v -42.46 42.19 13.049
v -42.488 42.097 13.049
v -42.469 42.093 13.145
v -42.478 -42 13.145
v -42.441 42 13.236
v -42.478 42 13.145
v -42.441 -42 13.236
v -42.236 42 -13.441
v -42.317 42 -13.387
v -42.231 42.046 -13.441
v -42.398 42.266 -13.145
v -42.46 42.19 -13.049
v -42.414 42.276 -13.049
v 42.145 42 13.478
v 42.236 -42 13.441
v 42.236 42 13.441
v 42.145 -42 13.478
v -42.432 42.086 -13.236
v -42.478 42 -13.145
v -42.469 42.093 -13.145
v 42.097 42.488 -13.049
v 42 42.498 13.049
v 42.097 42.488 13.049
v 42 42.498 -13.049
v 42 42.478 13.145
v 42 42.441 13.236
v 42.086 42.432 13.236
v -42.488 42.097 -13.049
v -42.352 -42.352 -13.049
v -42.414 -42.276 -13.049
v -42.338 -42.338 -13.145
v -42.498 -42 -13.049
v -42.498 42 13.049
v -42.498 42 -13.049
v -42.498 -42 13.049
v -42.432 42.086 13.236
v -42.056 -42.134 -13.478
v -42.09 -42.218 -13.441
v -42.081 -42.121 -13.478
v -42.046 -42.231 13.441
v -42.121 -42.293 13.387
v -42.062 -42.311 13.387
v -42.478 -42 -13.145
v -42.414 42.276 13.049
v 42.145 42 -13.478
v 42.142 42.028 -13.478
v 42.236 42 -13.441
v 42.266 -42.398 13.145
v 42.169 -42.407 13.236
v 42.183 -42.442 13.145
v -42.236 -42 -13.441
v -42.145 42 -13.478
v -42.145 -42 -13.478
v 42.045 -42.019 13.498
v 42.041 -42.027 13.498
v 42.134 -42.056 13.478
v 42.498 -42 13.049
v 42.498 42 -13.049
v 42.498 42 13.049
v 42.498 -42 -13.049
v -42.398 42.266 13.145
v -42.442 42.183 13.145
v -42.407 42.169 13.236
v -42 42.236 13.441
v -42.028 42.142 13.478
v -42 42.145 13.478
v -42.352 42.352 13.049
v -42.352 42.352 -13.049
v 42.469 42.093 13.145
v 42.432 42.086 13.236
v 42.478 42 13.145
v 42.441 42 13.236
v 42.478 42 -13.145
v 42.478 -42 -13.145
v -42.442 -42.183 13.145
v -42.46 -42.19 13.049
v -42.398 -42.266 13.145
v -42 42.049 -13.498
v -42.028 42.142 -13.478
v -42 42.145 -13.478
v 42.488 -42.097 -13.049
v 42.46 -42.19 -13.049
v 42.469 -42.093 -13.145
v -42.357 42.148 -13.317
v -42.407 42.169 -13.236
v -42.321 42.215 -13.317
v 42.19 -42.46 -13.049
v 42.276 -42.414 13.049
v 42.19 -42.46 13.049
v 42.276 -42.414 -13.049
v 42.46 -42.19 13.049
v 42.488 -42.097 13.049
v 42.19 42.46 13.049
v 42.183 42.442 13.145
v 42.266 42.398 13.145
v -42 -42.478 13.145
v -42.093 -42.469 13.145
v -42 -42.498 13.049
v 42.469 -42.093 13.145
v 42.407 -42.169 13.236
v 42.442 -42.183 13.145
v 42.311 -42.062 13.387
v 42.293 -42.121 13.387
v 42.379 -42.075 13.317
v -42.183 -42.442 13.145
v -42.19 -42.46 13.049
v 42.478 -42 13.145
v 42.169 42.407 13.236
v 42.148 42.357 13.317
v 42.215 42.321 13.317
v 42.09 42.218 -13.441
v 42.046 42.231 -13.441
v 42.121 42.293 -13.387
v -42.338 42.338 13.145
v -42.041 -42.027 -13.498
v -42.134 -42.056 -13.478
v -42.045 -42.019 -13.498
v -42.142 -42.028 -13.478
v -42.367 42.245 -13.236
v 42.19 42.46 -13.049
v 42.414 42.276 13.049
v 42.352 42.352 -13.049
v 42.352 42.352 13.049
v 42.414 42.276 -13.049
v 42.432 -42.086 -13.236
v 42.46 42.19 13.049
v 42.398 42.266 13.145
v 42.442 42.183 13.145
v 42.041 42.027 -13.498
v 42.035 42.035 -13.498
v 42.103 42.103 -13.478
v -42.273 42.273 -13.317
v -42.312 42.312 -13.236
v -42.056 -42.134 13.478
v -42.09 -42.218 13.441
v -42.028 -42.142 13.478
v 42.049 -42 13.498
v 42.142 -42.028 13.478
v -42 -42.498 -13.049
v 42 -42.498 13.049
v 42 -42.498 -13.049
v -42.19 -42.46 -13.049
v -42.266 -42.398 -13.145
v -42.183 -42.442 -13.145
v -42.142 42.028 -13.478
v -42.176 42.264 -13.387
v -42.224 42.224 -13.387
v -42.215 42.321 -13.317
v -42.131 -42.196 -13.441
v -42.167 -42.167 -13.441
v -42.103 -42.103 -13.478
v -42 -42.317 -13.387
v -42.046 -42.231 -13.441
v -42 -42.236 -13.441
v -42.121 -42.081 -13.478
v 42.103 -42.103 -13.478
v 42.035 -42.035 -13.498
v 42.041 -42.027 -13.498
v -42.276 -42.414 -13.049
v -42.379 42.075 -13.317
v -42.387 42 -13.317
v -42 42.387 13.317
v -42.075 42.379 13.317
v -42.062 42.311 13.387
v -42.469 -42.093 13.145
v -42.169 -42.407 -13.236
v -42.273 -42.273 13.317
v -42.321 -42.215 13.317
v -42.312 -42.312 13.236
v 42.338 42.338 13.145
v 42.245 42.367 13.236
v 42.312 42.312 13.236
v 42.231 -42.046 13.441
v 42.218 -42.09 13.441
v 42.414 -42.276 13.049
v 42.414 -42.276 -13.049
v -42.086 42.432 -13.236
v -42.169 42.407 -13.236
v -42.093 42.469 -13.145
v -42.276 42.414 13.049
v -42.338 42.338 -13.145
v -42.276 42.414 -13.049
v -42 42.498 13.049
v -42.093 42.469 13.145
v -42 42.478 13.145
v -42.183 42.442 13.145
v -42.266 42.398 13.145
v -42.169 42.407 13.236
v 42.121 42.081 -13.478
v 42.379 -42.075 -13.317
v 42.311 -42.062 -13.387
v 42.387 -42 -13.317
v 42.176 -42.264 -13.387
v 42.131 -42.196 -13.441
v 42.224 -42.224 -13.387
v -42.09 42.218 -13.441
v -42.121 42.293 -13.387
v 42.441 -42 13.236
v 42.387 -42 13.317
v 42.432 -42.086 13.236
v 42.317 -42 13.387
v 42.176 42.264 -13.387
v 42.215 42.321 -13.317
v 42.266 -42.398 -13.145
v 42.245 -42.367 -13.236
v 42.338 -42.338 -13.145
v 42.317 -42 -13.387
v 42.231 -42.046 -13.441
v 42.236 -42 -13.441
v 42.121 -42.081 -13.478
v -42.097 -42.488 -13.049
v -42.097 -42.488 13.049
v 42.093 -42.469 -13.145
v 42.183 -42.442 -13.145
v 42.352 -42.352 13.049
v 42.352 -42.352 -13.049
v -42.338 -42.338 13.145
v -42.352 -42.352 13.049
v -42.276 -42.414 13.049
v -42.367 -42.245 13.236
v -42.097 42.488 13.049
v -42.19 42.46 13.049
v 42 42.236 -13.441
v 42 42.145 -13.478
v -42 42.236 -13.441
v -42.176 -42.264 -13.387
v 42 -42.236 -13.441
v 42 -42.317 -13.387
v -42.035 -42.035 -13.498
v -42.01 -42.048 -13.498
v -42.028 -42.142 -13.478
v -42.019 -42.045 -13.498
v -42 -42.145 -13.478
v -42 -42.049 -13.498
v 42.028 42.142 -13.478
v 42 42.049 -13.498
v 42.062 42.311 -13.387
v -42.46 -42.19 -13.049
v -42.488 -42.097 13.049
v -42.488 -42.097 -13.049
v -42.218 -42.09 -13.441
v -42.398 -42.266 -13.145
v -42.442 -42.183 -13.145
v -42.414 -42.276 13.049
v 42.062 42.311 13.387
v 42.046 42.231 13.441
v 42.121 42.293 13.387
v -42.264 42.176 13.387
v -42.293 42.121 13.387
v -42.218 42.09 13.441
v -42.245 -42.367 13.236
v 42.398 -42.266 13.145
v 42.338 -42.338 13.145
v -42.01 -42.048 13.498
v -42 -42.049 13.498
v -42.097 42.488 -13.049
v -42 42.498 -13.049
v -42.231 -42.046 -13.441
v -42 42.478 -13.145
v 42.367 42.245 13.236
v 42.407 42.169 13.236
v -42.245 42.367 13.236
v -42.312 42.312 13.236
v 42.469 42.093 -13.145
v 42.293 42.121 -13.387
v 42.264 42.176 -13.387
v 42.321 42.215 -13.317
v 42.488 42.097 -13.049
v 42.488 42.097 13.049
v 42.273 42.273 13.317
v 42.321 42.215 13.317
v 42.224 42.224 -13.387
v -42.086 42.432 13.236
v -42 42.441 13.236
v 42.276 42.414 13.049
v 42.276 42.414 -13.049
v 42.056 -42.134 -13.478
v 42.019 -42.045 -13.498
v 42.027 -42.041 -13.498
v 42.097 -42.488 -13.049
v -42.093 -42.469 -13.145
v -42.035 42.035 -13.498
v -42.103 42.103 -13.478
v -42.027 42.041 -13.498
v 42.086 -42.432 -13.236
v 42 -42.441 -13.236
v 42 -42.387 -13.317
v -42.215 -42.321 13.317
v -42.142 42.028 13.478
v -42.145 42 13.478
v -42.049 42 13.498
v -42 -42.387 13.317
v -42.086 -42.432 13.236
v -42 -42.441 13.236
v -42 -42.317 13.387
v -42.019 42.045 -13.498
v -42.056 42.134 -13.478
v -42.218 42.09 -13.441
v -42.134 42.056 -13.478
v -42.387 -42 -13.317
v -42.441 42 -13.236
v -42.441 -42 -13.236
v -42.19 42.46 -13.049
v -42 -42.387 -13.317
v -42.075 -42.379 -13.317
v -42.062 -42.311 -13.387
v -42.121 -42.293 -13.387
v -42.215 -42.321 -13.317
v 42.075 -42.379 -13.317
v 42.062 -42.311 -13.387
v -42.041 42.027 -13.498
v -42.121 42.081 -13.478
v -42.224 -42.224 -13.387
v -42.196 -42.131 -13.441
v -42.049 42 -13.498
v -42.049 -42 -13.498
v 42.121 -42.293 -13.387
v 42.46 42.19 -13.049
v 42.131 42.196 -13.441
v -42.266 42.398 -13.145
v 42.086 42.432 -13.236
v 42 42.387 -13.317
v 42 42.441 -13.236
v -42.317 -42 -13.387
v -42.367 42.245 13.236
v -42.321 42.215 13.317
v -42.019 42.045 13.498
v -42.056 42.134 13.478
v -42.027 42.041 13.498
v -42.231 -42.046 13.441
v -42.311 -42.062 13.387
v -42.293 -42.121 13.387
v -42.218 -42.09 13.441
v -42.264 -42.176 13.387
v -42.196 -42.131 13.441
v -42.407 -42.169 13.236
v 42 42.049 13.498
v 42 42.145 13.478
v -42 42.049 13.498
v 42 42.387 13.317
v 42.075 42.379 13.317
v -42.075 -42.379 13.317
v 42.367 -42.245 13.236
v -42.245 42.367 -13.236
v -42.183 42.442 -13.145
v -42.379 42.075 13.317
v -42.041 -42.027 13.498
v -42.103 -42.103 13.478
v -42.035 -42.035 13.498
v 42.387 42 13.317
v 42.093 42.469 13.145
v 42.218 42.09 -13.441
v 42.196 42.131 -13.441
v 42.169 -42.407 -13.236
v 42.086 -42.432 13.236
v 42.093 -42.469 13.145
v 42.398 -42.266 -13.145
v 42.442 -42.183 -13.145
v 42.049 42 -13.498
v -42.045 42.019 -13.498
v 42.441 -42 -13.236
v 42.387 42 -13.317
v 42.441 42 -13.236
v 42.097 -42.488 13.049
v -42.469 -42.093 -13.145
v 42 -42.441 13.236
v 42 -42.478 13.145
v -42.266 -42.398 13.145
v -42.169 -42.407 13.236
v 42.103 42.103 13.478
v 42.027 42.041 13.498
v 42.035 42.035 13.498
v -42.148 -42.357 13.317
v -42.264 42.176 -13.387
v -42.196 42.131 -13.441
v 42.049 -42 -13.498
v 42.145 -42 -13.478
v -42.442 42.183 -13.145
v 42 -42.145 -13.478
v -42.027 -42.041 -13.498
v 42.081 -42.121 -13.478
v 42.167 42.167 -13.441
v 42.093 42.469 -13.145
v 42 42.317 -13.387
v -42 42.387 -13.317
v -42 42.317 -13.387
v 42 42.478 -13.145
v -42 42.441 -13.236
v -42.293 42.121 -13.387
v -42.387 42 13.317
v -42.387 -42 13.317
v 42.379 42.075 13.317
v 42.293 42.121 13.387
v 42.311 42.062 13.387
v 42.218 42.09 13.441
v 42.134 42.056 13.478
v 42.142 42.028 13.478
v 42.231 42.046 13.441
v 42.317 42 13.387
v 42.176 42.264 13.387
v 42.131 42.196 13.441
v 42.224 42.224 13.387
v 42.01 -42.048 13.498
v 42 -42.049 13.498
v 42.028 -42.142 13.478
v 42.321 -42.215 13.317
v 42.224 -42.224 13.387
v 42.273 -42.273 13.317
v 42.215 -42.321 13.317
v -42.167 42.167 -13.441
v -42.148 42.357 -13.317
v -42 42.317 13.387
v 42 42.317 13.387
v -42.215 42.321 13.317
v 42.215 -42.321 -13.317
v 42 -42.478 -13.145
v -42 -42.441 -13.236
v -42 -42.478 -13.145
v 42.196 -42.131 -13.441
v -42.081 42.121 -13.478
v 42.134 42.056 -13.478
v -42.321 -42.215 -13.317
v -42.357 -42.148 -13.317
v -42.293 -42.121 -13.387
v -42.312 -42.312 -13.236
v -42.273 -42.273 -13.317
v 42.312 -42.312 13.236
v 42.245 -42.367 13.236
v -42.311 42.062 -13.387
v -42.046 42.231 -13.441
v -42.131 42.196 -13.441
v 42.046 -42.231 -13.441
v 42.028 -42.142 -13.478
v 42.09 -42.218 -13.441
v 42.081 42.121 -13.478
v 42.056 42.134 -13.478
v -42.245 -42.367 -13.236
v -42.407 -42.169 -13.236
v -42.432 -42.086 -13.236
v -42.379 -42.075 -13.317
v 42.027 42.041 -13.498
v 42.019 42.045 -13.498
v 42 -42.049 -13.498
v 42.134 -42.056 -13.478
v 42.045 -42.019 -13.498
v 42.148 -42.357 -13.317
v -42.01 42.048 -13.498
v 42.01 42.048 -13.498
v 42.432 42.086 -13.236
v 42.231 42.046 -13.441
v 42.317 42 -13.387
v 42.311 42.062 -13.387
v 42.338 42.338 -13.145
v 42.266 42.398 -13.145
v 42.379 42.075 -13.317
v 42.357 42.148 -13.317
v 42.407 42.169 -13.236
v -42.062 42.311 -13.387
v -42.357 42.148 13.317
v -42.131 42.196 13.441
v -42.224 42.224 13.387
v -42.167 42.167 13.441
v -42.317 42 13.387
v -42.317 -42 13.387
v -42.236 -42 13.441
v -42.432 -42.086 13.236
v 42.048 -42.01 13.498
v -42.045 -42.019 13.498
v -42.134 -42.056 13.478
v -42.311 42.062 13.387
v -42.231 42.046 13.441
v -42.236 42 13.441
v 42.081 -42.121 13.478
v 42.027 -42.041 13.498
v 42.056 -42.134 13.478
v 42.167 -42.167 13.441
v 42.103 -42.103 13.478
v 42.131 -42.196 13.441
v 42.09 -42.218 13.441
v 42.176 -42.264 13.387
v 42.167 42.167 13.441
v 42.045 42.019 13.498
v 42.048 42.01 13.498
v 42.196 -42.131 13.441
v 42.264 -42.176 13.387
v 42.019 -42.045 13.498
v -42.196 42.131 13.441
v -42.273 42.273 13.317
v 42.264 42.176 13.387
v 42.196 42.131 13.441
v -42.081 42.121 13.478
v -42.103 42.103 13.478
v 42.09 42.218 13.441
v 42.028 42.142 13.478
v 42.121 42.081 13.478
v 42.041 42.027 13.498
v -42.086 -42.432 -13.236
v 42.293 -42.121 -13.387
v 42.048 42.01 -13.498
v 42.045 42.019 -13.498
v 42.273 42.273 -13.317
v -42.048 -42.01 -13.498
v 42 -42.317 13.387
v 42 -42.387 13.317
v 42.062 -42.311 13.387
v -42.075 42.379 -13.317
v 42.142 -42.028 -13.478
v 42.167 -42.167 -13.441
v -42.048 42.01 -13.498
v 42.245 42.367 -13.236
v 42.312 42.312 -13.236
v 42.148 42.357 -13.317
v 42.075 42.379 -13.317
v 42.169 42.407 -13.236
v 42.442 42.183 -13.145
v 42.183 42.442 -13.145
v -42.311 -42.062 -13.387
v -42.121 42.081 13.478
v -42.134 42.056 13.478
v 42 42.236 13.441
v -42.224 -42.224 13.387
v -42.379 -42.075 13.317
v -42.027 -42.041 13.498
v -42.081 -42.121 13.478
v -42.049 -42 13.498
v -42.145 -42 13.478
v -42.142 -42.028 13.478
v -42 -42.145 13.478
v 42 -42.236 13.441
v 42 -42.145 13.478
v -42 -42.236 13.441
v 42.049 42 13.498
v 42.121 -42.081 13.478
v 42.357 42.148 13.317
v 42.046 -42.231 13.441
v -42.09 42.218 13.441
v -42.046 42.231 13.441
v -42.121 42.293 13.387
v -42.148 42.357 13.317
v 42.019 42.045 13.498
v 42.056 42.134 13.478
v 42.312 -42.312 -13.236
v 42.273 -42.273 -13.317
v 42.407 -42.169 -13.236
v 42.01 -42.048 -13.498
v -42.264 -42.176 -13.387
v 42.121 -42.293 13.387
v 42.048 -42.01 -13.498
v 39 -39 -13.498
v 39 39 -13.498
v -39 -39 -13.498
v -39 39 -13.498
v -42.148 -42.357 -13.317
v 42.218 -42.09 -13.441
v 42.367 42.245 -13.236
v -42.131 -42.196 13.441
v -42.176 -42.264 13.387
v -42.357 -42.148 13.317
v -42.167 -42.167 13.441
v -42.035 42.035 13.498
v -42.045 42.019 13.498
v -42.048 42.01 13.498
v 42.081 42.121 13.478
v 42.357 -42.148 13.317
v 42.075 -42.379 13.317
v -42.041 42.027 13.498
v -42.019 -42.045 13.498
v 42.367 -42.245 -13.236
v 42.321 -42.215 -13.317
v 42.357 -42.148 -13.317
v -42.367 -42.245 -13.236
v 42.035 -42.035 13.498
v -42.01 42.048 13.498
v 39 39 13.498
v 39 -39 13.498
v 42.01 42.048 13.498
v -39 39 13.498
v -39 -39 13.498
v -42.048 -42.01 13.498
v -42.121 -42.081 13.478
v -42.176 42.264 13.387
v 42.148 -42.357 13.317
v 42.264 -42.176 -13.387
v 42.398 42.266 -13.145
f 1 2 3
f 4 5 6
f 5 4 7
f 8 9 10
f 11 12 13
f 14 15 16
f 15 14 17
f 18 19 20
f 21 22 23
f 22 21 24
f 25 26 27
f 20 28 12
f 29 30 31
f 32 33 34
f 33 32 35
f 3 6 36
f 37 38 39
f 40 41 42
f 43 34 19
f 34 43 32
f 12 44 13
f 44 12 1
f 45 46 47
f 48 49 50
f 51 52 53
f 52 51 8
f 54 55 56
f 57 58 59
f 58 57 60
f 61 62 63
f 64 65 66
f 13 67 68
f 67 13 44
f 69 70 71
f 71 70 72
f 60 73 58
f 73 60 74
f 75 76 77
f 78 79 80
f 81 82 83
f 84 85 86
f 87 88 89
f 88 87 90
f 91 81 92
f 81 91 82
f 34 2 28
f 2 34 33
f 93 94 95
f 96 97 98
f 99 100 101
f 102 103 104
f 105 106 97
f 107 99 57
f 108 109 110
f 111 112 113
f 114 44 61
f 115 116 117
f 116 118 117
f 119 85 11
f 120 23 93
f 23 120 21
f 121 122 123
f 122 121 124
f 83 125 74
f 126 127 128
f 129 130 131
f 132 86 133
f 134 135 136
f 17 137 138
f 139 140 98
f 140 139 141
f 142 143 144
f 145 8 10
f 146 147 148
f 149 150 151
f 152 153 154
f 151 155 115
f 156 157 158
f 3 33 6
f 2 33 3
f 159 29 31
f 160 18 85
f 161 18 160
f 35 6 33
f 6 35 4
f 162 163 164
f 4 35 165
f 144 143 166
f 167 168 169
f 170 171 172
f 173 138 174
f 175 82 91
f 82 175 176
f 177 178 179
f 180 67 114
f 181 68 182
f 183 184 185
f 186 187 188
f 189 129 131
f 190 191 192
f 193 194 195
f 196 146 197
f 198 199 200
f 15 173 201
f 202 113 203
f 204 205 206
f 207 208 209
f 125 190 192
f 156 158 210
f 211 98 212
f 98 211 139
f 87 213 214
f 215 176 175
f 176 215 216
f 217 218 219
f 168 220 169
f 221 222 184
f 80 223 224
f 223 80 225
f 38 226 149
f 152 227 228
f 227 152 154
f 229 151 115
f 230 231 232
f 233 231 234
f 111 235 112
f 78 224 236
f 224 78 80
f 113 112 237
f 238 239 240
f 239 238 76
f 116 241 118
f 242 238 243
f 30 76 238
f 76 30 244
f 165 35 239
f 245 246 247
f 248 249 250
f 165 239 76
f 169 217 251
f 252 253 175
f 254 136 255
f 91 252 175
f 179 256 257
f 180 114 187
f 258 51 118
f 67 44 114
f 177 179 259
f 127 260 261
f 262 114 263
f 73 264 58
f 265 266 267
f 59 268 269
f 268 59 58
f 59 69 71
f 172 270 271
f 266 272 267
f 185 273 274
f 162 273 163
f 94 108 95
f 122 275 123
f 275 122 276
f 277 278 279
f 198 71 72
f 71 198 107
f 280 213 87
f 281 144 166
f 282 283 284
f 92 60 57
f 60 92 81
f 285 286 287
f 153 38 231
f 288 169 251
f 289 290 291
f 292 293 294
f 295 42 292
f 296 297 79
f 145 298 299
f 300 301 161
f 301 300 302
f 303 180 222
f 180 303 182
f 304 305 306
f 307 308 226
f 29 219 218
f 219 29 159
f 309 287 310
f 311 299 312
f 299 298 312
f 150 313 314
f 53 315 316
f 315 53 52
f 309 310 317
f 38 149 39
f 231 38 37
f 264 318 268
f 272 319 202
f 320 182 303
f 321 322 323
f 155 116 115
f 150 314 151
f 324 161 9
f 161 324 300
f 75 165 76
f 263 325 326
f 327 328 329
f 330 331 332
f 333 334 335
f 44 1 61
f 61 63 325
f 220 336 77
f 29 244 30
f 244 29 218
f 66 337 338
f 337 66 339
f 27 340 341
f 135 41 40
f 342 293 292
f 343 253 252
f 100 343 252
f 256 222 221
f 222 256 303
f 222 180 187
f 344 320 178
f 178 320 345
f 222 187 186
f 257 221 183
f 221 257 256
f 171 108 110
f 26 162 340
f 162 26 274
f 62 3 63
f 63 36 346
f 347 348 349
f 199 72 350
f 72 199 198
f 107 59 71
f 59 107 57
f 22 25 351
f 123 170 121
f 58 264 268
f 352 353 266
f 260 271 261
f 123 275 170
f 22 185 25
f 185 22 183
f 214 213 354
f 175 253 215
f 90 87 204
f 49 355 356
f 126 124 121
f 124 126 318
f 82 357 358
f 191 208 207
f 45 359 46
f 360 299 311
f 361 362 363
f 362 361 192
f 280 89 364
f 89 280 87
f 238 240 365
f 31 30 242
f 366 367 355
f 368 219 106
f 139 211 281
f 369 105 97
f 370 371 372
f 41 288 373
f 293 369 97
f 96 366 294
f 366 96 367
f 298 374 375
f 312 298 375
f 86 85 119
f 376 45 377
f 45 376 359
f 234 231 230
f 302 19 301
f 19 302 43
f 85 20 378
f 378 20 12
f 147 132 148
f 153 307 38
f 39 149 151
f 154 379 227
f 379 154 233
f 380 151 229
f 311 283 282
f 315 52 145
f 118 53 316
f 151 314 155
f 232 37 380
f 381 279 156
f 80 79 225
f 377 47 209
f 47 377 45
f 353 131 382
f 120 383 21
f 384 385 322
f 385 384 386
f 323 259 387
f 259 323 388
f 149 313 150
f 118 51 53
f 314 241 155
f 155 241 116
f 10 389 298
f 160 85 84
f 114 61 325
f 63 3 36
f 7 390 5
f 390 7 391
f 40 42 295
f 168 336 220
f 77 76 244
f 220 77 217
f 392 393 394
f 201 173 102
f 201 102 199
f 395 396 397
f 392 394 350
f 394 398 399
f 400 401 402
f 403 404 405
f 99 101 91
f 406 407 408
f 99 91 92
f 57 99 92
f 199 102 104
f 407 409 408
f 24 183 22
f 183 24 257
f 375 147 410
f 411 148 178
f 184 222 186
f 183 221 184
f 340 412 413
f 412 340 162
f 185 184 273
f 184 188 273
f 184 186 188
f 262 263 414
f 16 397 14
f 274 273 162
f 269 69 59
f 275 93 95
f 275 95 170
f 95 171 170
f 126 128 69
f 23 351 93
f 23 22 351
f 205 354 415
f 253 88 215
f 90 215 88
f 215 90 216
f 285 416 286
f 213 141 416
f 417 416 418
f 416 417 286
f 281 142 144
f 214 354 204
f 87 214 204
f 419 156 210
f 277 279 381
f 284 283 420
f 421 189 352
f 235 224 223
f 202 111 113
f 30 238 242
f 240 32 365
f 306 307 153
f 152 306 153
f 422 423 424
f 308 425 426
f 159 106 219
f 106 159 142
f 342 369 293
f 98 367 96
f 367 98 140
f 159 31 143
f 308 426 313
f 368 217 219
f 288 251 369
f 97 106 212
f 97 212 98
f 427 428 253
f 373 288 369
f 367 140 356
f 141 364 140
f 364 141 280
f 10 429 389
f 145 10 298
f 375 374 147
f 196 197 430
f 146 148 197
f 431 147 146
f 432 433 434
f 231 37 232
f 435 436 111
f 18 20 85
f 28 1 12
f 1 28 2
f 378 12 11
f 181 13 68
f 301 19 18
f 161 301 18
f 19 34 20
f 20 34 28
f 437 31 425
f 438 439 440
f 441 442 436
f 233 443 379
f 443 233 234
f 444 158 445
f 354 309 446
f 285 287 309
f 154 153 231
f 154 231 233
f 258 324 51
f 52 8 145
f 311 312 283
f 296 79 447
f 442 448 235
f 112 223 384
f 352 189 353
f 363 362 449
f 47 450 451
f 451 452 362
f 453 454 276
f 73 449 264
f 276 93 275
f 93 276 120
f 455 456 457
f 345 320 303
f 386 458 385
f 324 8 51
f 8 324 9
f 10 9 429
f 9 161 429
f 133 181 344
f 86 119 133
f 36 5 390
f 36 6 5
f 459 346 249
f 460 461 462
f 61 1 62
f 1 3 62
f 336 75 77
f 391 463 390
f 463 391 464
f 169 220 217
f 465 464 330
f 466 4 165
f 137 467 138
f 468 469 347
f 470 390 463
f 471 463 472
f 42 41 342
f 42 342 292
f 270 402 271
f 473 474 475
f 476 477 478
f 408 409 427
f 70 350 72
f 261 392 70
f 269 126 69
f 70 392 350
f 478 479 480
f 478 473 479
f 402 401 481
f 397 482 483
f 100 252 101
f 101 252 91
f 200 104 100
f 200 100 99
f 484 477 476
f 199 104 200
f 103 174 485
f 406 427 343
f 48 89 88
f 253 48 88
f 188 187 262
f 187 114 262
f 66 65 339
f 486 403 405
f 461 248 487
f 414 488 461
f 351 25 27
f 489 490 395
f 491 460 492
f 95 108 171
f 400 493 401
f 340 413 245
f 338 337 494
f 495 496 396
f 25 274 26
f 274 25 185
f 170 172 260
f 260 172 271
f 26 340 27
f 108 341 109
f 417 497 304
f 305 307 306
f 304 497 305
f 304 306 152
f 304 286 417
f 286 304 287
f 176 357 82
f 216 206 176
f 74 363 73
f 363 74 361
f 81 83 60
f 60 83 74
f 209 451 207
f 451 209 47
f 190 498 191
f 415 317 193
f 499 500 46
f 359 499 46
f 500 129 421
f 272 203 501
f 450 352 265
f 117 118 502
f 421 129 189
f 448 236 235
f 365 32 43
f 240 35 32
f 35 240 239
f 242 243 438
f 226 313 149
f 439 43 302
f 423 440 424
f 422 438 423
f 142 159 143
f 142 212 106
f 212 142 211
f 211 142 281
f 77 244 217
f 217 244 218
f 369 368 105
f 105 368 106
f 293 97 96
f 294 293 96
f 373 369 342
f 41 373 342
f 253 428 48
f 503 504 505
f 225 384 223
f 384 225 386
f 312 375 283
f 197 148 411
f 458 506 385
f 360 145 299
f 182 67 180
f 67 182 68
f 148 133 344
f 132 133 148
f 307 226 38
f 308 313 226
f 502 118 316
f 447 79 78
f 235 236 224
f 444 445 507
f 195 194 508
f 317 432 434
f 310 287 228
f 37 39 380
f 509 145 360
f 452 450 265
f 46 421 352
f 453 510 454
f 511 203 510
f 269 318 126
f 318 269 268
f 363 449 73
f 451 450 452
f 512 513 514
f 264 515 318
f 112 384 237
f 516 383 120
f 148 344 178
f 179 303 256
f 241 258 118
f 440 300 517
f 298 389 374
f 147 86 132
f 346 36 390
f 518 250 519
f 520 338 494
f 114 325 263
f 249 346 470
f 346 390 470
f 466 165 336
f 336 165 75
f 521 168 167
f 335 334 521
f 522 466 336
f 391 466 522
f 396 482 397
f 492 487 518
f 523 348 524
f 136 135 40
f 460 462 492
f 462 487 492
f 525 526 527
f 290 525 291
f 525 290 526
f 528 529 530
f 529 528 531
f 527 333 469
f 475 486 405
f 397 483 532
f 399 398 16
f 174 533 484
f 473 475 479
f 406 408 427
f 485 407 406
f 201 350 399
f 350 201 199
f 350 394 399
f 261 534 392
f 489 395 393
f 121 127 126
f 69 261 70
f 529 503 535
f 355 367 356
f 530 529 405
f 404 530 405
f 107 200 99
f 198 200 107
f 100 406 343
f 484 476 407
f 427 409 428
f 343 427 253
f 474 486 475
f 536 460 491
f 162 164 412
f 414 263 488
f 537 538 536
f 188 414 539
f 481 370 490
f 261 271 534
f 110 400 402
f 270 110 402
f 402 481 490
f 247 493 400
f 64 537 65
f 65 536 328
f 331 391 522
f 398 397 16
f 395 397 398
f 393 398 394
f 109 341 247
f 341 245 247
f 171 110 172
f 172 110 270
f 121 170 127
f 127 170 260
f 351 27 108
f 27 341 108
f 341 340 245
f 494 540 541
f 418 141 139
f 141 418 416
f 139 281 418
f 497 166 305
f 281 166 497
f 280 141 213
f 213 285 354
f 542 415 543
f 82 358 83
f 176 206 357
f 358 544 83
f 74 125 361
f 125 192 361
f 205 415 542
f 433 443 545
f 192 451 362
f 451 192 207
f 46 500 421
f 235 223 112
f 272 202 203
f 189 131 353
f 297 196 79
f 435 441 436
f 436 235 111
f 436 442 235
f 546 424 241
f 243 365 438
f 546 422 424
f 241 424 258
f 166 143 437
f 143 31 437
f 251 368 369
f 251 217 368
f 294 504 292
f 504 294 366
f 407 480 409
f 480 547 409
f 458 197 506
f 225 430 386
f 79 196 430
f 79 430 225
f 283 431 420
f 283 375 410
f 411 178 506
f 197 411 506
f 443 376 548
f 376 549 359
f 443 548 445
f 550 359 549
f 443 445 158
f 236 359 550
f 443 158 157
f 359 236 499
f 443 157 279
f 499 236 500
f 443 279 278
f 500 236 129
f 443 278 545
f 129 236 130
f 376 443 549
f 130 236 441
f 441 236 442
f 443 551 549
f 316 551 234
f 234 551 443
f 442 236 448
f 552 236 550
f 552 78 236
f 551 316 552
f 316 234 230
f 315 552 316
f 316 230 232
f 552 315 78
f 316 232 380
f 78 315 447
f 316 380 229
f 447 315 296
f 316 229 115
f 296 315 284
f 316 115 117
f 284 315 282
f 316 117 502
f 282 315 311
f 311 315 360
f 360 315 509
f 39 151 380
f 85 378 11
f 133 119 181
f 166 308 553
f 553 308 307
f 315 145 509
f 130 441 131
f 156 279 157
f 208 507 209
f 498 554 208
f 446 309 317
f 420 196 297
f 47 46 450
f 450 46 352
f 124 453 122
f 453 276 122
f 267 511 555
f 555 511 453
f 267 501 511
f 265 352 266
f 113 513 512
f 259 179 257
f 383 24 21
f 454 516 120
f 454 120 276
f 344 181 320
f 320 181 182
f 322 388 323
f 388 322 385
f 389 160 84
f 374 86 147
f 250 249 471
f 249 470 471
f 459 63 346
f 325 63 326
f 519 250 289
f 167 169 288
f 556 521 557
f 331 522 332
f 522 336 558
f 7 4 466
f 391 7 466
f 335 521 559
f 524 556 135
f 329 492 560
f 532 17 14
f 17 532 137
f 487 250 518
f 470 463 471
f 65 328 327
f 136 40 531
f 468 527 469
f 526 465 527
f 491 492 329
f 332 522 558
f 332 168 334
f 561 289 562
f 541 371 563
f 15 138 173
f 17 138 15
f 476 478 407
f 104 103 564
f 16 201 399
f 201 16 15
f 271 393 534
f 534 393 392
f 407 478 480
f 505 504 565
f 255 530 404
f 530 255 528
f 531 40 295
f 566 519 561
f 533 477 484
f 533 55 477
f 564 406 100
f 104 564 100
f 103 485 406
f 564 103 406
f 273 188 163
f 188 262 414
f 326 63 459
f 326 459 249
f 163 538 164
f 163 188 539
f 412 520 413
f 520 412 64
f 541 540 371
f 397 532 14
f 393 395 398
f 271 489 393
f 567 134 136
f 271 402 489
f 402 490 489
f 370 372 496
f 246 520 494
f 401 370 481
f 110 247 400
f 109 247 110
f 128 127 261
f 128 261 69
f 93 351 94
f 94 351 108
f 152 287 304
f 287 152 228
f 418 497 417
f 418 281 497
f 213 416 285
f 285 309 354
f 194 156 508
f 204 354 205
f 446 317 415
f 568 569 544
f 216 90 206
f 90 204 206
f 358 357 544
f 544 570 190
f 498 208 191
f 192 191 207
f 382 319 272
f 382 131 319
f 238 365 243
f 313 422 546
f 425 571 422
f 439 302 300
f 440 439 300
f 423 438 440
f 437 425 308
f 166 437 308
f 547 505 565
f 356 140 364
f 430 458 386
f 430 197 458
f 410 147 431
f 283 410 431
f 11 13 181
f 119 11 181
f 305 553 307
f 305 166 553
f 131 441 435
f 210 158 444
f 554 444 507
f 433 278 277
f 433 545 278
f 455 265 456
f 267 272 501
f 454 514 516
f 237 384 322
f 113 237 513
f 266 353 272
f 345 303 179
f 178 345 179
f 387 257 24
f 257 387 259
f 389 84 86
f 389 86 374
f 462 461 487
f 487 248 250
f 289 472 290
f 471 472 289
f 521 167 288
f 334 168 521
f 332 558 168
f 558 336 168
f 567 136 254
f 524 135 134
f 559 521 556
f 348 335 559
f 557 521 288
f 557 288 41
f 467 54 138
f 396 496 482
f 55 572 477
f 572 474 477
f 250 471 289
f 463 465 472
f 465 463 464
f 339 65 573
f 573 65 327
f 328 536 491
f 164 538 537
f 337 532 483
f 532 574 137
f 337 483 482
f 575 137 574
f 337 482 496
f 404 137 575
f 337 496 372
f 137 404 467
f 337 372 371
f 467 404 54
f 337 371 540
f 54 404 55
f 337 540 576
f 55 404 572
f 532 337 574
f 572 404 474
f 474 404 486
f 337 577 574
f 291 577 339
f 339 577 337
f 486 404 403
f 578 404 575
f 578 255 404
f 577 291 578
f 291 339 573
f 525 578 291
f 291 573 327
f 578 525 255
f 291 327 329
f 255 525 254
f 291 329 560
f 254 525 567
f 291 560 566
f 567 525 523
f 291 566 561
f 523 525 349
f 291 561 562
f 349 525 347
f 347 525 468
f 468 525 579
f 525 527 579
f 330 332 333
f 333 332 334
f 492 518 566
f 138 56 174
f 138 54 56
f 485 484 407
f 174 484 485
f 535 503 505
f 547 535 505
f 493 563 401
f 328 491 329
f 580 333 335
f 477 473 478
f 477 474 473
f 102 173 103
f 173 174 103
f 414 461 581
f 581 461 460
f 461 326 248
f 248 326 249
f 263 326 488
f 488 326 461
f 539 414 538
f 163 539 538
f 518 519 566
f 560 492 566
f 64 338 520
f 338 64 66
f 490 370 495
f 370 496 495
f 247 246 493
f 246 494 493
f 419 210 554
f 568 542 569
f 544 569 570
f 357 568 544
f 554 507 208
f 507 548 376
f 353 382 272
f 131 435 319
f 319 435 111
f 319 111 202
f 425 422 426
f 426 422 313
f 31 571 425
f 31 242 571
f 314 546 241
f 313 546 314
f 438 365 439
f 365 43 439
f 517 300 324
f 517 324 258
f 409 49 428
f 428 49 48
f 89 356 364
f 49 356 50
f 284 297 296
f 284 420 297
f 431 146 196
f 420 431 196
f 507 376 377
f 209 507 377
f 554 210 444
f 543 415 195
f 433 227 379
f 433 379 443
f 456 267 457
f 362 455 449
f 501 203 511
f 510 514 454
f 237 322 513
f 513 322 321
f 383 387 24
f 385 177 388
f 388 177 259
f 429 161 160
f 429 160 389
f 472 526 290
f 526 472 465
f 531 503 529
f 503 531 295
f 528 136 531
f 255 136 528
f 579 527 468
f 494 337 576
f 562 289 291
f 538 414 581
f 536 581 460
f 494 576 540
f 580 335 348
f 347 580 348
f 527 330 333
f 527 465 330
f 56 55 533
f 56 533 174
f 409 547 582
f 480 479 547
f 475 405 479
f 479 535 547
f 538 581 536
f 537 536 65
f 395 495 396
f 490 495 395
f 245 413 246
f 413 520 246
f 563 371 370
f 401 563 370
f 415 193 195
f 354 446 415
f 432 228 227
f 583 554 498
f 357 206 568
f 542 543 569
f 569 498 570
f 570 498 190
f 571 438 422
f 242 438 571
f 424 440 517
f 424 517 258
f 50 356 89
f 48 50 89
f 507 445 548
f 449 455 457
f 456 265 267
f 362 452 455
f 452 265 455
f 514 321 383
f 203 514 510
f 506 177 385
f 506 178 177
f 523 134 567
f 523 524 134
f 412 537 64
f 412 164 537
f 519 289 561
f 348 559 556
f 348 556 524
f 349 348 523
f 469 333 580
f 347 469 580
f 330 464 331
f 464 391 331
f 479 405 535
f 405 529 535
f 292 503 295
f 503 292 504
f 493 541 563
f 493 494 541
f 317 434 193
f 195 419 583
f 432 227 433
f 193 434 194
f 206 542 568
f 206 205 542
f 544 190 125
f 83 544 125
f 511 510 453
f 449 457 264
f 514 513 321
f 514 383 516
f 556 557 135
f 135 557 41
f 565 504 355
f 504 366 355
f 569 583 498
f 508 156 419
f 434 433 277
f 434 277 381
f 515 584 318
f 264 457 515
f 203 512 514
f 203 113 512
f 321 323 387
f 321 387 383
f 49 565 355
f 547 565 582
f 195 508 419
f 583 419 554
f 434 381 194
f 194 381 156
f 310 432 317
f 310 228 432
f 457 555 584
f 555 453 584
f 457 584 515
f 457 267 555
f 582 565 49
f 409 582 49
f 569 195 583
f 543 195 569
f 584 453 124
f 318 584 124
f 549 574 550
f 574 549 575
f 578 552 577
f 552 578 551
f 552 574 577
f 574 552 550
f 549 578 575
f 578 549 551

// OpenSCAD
// file: roundedcube.scad
// https://danielupshaw.com/openscad-rounded-corners/

module roundedcube(size = [ 1, 1, 1 ], center = false, radius = 0.5, apply_to = "all")
{
  /*
    // An [x, y, z] vector specifies distance on each axis. Default [1, 1, 1]
    size = [2, 3, 5];

    // An integer creates a cube with specified wall distance. Default [1, 1, 1]
    size = 5;

    // Whether or not to place the object centered on the origin. Default false
    center = true|false;

    // Specify a rounding radius. Default 0.5
    radius = 0.5

    // Specify where to apply the rounded corners. Default "all"
    apply_to = "all"|"x"|"y"|"z"|"zmax"|"zmin"|"xmax"|"xmin"|"ymax"|"ymin"

    roundedcube(size, center, radius, apply_to);
  */

    // If single value, convert to [x, y, z] vector
    size = (size[0] == undef) ? [ size, size, size ] : size;

    translate_min = radius;
    translate_xmax = size[0] - radius;
    translate_ymax = size[1] - radius;
    translate_zmax = size[2] - radius;

    diameter = radius * 2;

    module build_point(type = "sphere", rotate = [ 0, 0, 0 ])
    {
        if (type == "sphere")
        {
            sphere(r = radius);
        }
        else if (type == "cylinder")
        {
            rotate(a = rotate) cylinder(h = diameter, r = radius, center = true);
        }
    }

    obj_translate = (center == false) ? [ 0, 0, 0 ] : [ -(size[0] / 2), -(size[1] / 2), -(size[2] / 2) ];

    translate(v = obj_translate)
    {
        hull()
        {
            for (translate_x = [ translate_min, translate_xmax ])
            {
                x_at = (translate_x == translate_min) ? "min" : "max";
                for (translate_y = [ translate_min, translate_ymax ])
                {
                    y_at = (translate_y == translate_min) ? "min" : "max";
                    for (translate_z = [ translate_min, translate_zmax ])
                    {
                        z_at = (translate_z == translate_min) ? "min" : "max";

                        translate(
                            v = [ translate_x, translate_y, translate_z ]) if ((apply_to == "all") ||
                                                                               (apply_to == "xmin" && x_at == "min") ||
                                                                               (apply_to == "xmax" && x_at == "max") ||
                                                                               (apply_to == "ymin" && y_at == "min") ||
                                                                               (apply_to == "ymax" && y_at == "max") ||
                                                                               (apply_to == "zmin" && z_at == "min") ||
                                                                               (apply_to == "zmax" && z_at == "max"))
                        {
                            build_point("sphere");
                        }
                        else
                        {
                            rotate =
                                (apply_to == "xmin" || apply_to == "xmax" || apply_to == "x")
                                    ? [ 0, 90, 0 ]
                                    : ((apply_to == "ymin" || apply_to == "ymax" || apply_to == "y") ? [ 90, 90, 0 ]
                                                                                                     : [ 0, 0, 0 ]);
                            build_point("cylinder", rotate);
                        }
                    }
                }
            }
        }
    }
}
// main file
use <roundedcube.scad>

$fs = $preview ? 0.3 : 0.1;
$fa = $preview ? 0.3 : 0.1;

ff = 0.001;  // Universal fudge

banister_x = 76;  // Banister width (x)
banister_y = 76;  // Banister depth (y)
felt = 2;         // padding thickness

bracket_t = 7;   // How thick the bracket is
bracket_h = 27;  // Bracket height (z)

// going to use a #8-32 x 1.5" bolt
bolt_head_d = 8.4;     // Diameter of the bolt head pocket (should be slightly larger than actual)
bolt_hole_d = 4.5;     // Diameter of the Bolt's screw (+ wiggle)
bolt_nut_d = 9.7;      // Nut's max diameter (go close to accurate)
bolt_nut_depth = 4.5;  // How deep should the pocket be? Used for head side too.
bolt_nut_nsides = 6;   // Number of sides for the nut

// - done config -

// With felt
banister_xf = banister_x + felt;
banister_yf = banister_y + felt;

difference() {
  // bracket base
  color("green", 1.0)
    roundedcube([ banister_xf + bracket_t, banister_yf + bracket_t, bracket_h ], center = true);

  // banister
  color("BurlyWood", 0.2)
    cube([ banister_xf, banister_yf, bracket_h * 6 ], center = true);
}  // difference()
// nut
// cylinder(h=bolt_nut_depth, d=bolt_nut_d, center=true, $fn=bolt_nut_nsides);

module cylinder_outer(height, radius, fn) {
  // https://en.wikibooks.org/wiki/OpenSCAD_User_Manual/undersized_circular_objects
  fudge = 1 / cos(180 / fn);
  cylinder(h = height, r = radius * fudge, $fn = fn);
}
